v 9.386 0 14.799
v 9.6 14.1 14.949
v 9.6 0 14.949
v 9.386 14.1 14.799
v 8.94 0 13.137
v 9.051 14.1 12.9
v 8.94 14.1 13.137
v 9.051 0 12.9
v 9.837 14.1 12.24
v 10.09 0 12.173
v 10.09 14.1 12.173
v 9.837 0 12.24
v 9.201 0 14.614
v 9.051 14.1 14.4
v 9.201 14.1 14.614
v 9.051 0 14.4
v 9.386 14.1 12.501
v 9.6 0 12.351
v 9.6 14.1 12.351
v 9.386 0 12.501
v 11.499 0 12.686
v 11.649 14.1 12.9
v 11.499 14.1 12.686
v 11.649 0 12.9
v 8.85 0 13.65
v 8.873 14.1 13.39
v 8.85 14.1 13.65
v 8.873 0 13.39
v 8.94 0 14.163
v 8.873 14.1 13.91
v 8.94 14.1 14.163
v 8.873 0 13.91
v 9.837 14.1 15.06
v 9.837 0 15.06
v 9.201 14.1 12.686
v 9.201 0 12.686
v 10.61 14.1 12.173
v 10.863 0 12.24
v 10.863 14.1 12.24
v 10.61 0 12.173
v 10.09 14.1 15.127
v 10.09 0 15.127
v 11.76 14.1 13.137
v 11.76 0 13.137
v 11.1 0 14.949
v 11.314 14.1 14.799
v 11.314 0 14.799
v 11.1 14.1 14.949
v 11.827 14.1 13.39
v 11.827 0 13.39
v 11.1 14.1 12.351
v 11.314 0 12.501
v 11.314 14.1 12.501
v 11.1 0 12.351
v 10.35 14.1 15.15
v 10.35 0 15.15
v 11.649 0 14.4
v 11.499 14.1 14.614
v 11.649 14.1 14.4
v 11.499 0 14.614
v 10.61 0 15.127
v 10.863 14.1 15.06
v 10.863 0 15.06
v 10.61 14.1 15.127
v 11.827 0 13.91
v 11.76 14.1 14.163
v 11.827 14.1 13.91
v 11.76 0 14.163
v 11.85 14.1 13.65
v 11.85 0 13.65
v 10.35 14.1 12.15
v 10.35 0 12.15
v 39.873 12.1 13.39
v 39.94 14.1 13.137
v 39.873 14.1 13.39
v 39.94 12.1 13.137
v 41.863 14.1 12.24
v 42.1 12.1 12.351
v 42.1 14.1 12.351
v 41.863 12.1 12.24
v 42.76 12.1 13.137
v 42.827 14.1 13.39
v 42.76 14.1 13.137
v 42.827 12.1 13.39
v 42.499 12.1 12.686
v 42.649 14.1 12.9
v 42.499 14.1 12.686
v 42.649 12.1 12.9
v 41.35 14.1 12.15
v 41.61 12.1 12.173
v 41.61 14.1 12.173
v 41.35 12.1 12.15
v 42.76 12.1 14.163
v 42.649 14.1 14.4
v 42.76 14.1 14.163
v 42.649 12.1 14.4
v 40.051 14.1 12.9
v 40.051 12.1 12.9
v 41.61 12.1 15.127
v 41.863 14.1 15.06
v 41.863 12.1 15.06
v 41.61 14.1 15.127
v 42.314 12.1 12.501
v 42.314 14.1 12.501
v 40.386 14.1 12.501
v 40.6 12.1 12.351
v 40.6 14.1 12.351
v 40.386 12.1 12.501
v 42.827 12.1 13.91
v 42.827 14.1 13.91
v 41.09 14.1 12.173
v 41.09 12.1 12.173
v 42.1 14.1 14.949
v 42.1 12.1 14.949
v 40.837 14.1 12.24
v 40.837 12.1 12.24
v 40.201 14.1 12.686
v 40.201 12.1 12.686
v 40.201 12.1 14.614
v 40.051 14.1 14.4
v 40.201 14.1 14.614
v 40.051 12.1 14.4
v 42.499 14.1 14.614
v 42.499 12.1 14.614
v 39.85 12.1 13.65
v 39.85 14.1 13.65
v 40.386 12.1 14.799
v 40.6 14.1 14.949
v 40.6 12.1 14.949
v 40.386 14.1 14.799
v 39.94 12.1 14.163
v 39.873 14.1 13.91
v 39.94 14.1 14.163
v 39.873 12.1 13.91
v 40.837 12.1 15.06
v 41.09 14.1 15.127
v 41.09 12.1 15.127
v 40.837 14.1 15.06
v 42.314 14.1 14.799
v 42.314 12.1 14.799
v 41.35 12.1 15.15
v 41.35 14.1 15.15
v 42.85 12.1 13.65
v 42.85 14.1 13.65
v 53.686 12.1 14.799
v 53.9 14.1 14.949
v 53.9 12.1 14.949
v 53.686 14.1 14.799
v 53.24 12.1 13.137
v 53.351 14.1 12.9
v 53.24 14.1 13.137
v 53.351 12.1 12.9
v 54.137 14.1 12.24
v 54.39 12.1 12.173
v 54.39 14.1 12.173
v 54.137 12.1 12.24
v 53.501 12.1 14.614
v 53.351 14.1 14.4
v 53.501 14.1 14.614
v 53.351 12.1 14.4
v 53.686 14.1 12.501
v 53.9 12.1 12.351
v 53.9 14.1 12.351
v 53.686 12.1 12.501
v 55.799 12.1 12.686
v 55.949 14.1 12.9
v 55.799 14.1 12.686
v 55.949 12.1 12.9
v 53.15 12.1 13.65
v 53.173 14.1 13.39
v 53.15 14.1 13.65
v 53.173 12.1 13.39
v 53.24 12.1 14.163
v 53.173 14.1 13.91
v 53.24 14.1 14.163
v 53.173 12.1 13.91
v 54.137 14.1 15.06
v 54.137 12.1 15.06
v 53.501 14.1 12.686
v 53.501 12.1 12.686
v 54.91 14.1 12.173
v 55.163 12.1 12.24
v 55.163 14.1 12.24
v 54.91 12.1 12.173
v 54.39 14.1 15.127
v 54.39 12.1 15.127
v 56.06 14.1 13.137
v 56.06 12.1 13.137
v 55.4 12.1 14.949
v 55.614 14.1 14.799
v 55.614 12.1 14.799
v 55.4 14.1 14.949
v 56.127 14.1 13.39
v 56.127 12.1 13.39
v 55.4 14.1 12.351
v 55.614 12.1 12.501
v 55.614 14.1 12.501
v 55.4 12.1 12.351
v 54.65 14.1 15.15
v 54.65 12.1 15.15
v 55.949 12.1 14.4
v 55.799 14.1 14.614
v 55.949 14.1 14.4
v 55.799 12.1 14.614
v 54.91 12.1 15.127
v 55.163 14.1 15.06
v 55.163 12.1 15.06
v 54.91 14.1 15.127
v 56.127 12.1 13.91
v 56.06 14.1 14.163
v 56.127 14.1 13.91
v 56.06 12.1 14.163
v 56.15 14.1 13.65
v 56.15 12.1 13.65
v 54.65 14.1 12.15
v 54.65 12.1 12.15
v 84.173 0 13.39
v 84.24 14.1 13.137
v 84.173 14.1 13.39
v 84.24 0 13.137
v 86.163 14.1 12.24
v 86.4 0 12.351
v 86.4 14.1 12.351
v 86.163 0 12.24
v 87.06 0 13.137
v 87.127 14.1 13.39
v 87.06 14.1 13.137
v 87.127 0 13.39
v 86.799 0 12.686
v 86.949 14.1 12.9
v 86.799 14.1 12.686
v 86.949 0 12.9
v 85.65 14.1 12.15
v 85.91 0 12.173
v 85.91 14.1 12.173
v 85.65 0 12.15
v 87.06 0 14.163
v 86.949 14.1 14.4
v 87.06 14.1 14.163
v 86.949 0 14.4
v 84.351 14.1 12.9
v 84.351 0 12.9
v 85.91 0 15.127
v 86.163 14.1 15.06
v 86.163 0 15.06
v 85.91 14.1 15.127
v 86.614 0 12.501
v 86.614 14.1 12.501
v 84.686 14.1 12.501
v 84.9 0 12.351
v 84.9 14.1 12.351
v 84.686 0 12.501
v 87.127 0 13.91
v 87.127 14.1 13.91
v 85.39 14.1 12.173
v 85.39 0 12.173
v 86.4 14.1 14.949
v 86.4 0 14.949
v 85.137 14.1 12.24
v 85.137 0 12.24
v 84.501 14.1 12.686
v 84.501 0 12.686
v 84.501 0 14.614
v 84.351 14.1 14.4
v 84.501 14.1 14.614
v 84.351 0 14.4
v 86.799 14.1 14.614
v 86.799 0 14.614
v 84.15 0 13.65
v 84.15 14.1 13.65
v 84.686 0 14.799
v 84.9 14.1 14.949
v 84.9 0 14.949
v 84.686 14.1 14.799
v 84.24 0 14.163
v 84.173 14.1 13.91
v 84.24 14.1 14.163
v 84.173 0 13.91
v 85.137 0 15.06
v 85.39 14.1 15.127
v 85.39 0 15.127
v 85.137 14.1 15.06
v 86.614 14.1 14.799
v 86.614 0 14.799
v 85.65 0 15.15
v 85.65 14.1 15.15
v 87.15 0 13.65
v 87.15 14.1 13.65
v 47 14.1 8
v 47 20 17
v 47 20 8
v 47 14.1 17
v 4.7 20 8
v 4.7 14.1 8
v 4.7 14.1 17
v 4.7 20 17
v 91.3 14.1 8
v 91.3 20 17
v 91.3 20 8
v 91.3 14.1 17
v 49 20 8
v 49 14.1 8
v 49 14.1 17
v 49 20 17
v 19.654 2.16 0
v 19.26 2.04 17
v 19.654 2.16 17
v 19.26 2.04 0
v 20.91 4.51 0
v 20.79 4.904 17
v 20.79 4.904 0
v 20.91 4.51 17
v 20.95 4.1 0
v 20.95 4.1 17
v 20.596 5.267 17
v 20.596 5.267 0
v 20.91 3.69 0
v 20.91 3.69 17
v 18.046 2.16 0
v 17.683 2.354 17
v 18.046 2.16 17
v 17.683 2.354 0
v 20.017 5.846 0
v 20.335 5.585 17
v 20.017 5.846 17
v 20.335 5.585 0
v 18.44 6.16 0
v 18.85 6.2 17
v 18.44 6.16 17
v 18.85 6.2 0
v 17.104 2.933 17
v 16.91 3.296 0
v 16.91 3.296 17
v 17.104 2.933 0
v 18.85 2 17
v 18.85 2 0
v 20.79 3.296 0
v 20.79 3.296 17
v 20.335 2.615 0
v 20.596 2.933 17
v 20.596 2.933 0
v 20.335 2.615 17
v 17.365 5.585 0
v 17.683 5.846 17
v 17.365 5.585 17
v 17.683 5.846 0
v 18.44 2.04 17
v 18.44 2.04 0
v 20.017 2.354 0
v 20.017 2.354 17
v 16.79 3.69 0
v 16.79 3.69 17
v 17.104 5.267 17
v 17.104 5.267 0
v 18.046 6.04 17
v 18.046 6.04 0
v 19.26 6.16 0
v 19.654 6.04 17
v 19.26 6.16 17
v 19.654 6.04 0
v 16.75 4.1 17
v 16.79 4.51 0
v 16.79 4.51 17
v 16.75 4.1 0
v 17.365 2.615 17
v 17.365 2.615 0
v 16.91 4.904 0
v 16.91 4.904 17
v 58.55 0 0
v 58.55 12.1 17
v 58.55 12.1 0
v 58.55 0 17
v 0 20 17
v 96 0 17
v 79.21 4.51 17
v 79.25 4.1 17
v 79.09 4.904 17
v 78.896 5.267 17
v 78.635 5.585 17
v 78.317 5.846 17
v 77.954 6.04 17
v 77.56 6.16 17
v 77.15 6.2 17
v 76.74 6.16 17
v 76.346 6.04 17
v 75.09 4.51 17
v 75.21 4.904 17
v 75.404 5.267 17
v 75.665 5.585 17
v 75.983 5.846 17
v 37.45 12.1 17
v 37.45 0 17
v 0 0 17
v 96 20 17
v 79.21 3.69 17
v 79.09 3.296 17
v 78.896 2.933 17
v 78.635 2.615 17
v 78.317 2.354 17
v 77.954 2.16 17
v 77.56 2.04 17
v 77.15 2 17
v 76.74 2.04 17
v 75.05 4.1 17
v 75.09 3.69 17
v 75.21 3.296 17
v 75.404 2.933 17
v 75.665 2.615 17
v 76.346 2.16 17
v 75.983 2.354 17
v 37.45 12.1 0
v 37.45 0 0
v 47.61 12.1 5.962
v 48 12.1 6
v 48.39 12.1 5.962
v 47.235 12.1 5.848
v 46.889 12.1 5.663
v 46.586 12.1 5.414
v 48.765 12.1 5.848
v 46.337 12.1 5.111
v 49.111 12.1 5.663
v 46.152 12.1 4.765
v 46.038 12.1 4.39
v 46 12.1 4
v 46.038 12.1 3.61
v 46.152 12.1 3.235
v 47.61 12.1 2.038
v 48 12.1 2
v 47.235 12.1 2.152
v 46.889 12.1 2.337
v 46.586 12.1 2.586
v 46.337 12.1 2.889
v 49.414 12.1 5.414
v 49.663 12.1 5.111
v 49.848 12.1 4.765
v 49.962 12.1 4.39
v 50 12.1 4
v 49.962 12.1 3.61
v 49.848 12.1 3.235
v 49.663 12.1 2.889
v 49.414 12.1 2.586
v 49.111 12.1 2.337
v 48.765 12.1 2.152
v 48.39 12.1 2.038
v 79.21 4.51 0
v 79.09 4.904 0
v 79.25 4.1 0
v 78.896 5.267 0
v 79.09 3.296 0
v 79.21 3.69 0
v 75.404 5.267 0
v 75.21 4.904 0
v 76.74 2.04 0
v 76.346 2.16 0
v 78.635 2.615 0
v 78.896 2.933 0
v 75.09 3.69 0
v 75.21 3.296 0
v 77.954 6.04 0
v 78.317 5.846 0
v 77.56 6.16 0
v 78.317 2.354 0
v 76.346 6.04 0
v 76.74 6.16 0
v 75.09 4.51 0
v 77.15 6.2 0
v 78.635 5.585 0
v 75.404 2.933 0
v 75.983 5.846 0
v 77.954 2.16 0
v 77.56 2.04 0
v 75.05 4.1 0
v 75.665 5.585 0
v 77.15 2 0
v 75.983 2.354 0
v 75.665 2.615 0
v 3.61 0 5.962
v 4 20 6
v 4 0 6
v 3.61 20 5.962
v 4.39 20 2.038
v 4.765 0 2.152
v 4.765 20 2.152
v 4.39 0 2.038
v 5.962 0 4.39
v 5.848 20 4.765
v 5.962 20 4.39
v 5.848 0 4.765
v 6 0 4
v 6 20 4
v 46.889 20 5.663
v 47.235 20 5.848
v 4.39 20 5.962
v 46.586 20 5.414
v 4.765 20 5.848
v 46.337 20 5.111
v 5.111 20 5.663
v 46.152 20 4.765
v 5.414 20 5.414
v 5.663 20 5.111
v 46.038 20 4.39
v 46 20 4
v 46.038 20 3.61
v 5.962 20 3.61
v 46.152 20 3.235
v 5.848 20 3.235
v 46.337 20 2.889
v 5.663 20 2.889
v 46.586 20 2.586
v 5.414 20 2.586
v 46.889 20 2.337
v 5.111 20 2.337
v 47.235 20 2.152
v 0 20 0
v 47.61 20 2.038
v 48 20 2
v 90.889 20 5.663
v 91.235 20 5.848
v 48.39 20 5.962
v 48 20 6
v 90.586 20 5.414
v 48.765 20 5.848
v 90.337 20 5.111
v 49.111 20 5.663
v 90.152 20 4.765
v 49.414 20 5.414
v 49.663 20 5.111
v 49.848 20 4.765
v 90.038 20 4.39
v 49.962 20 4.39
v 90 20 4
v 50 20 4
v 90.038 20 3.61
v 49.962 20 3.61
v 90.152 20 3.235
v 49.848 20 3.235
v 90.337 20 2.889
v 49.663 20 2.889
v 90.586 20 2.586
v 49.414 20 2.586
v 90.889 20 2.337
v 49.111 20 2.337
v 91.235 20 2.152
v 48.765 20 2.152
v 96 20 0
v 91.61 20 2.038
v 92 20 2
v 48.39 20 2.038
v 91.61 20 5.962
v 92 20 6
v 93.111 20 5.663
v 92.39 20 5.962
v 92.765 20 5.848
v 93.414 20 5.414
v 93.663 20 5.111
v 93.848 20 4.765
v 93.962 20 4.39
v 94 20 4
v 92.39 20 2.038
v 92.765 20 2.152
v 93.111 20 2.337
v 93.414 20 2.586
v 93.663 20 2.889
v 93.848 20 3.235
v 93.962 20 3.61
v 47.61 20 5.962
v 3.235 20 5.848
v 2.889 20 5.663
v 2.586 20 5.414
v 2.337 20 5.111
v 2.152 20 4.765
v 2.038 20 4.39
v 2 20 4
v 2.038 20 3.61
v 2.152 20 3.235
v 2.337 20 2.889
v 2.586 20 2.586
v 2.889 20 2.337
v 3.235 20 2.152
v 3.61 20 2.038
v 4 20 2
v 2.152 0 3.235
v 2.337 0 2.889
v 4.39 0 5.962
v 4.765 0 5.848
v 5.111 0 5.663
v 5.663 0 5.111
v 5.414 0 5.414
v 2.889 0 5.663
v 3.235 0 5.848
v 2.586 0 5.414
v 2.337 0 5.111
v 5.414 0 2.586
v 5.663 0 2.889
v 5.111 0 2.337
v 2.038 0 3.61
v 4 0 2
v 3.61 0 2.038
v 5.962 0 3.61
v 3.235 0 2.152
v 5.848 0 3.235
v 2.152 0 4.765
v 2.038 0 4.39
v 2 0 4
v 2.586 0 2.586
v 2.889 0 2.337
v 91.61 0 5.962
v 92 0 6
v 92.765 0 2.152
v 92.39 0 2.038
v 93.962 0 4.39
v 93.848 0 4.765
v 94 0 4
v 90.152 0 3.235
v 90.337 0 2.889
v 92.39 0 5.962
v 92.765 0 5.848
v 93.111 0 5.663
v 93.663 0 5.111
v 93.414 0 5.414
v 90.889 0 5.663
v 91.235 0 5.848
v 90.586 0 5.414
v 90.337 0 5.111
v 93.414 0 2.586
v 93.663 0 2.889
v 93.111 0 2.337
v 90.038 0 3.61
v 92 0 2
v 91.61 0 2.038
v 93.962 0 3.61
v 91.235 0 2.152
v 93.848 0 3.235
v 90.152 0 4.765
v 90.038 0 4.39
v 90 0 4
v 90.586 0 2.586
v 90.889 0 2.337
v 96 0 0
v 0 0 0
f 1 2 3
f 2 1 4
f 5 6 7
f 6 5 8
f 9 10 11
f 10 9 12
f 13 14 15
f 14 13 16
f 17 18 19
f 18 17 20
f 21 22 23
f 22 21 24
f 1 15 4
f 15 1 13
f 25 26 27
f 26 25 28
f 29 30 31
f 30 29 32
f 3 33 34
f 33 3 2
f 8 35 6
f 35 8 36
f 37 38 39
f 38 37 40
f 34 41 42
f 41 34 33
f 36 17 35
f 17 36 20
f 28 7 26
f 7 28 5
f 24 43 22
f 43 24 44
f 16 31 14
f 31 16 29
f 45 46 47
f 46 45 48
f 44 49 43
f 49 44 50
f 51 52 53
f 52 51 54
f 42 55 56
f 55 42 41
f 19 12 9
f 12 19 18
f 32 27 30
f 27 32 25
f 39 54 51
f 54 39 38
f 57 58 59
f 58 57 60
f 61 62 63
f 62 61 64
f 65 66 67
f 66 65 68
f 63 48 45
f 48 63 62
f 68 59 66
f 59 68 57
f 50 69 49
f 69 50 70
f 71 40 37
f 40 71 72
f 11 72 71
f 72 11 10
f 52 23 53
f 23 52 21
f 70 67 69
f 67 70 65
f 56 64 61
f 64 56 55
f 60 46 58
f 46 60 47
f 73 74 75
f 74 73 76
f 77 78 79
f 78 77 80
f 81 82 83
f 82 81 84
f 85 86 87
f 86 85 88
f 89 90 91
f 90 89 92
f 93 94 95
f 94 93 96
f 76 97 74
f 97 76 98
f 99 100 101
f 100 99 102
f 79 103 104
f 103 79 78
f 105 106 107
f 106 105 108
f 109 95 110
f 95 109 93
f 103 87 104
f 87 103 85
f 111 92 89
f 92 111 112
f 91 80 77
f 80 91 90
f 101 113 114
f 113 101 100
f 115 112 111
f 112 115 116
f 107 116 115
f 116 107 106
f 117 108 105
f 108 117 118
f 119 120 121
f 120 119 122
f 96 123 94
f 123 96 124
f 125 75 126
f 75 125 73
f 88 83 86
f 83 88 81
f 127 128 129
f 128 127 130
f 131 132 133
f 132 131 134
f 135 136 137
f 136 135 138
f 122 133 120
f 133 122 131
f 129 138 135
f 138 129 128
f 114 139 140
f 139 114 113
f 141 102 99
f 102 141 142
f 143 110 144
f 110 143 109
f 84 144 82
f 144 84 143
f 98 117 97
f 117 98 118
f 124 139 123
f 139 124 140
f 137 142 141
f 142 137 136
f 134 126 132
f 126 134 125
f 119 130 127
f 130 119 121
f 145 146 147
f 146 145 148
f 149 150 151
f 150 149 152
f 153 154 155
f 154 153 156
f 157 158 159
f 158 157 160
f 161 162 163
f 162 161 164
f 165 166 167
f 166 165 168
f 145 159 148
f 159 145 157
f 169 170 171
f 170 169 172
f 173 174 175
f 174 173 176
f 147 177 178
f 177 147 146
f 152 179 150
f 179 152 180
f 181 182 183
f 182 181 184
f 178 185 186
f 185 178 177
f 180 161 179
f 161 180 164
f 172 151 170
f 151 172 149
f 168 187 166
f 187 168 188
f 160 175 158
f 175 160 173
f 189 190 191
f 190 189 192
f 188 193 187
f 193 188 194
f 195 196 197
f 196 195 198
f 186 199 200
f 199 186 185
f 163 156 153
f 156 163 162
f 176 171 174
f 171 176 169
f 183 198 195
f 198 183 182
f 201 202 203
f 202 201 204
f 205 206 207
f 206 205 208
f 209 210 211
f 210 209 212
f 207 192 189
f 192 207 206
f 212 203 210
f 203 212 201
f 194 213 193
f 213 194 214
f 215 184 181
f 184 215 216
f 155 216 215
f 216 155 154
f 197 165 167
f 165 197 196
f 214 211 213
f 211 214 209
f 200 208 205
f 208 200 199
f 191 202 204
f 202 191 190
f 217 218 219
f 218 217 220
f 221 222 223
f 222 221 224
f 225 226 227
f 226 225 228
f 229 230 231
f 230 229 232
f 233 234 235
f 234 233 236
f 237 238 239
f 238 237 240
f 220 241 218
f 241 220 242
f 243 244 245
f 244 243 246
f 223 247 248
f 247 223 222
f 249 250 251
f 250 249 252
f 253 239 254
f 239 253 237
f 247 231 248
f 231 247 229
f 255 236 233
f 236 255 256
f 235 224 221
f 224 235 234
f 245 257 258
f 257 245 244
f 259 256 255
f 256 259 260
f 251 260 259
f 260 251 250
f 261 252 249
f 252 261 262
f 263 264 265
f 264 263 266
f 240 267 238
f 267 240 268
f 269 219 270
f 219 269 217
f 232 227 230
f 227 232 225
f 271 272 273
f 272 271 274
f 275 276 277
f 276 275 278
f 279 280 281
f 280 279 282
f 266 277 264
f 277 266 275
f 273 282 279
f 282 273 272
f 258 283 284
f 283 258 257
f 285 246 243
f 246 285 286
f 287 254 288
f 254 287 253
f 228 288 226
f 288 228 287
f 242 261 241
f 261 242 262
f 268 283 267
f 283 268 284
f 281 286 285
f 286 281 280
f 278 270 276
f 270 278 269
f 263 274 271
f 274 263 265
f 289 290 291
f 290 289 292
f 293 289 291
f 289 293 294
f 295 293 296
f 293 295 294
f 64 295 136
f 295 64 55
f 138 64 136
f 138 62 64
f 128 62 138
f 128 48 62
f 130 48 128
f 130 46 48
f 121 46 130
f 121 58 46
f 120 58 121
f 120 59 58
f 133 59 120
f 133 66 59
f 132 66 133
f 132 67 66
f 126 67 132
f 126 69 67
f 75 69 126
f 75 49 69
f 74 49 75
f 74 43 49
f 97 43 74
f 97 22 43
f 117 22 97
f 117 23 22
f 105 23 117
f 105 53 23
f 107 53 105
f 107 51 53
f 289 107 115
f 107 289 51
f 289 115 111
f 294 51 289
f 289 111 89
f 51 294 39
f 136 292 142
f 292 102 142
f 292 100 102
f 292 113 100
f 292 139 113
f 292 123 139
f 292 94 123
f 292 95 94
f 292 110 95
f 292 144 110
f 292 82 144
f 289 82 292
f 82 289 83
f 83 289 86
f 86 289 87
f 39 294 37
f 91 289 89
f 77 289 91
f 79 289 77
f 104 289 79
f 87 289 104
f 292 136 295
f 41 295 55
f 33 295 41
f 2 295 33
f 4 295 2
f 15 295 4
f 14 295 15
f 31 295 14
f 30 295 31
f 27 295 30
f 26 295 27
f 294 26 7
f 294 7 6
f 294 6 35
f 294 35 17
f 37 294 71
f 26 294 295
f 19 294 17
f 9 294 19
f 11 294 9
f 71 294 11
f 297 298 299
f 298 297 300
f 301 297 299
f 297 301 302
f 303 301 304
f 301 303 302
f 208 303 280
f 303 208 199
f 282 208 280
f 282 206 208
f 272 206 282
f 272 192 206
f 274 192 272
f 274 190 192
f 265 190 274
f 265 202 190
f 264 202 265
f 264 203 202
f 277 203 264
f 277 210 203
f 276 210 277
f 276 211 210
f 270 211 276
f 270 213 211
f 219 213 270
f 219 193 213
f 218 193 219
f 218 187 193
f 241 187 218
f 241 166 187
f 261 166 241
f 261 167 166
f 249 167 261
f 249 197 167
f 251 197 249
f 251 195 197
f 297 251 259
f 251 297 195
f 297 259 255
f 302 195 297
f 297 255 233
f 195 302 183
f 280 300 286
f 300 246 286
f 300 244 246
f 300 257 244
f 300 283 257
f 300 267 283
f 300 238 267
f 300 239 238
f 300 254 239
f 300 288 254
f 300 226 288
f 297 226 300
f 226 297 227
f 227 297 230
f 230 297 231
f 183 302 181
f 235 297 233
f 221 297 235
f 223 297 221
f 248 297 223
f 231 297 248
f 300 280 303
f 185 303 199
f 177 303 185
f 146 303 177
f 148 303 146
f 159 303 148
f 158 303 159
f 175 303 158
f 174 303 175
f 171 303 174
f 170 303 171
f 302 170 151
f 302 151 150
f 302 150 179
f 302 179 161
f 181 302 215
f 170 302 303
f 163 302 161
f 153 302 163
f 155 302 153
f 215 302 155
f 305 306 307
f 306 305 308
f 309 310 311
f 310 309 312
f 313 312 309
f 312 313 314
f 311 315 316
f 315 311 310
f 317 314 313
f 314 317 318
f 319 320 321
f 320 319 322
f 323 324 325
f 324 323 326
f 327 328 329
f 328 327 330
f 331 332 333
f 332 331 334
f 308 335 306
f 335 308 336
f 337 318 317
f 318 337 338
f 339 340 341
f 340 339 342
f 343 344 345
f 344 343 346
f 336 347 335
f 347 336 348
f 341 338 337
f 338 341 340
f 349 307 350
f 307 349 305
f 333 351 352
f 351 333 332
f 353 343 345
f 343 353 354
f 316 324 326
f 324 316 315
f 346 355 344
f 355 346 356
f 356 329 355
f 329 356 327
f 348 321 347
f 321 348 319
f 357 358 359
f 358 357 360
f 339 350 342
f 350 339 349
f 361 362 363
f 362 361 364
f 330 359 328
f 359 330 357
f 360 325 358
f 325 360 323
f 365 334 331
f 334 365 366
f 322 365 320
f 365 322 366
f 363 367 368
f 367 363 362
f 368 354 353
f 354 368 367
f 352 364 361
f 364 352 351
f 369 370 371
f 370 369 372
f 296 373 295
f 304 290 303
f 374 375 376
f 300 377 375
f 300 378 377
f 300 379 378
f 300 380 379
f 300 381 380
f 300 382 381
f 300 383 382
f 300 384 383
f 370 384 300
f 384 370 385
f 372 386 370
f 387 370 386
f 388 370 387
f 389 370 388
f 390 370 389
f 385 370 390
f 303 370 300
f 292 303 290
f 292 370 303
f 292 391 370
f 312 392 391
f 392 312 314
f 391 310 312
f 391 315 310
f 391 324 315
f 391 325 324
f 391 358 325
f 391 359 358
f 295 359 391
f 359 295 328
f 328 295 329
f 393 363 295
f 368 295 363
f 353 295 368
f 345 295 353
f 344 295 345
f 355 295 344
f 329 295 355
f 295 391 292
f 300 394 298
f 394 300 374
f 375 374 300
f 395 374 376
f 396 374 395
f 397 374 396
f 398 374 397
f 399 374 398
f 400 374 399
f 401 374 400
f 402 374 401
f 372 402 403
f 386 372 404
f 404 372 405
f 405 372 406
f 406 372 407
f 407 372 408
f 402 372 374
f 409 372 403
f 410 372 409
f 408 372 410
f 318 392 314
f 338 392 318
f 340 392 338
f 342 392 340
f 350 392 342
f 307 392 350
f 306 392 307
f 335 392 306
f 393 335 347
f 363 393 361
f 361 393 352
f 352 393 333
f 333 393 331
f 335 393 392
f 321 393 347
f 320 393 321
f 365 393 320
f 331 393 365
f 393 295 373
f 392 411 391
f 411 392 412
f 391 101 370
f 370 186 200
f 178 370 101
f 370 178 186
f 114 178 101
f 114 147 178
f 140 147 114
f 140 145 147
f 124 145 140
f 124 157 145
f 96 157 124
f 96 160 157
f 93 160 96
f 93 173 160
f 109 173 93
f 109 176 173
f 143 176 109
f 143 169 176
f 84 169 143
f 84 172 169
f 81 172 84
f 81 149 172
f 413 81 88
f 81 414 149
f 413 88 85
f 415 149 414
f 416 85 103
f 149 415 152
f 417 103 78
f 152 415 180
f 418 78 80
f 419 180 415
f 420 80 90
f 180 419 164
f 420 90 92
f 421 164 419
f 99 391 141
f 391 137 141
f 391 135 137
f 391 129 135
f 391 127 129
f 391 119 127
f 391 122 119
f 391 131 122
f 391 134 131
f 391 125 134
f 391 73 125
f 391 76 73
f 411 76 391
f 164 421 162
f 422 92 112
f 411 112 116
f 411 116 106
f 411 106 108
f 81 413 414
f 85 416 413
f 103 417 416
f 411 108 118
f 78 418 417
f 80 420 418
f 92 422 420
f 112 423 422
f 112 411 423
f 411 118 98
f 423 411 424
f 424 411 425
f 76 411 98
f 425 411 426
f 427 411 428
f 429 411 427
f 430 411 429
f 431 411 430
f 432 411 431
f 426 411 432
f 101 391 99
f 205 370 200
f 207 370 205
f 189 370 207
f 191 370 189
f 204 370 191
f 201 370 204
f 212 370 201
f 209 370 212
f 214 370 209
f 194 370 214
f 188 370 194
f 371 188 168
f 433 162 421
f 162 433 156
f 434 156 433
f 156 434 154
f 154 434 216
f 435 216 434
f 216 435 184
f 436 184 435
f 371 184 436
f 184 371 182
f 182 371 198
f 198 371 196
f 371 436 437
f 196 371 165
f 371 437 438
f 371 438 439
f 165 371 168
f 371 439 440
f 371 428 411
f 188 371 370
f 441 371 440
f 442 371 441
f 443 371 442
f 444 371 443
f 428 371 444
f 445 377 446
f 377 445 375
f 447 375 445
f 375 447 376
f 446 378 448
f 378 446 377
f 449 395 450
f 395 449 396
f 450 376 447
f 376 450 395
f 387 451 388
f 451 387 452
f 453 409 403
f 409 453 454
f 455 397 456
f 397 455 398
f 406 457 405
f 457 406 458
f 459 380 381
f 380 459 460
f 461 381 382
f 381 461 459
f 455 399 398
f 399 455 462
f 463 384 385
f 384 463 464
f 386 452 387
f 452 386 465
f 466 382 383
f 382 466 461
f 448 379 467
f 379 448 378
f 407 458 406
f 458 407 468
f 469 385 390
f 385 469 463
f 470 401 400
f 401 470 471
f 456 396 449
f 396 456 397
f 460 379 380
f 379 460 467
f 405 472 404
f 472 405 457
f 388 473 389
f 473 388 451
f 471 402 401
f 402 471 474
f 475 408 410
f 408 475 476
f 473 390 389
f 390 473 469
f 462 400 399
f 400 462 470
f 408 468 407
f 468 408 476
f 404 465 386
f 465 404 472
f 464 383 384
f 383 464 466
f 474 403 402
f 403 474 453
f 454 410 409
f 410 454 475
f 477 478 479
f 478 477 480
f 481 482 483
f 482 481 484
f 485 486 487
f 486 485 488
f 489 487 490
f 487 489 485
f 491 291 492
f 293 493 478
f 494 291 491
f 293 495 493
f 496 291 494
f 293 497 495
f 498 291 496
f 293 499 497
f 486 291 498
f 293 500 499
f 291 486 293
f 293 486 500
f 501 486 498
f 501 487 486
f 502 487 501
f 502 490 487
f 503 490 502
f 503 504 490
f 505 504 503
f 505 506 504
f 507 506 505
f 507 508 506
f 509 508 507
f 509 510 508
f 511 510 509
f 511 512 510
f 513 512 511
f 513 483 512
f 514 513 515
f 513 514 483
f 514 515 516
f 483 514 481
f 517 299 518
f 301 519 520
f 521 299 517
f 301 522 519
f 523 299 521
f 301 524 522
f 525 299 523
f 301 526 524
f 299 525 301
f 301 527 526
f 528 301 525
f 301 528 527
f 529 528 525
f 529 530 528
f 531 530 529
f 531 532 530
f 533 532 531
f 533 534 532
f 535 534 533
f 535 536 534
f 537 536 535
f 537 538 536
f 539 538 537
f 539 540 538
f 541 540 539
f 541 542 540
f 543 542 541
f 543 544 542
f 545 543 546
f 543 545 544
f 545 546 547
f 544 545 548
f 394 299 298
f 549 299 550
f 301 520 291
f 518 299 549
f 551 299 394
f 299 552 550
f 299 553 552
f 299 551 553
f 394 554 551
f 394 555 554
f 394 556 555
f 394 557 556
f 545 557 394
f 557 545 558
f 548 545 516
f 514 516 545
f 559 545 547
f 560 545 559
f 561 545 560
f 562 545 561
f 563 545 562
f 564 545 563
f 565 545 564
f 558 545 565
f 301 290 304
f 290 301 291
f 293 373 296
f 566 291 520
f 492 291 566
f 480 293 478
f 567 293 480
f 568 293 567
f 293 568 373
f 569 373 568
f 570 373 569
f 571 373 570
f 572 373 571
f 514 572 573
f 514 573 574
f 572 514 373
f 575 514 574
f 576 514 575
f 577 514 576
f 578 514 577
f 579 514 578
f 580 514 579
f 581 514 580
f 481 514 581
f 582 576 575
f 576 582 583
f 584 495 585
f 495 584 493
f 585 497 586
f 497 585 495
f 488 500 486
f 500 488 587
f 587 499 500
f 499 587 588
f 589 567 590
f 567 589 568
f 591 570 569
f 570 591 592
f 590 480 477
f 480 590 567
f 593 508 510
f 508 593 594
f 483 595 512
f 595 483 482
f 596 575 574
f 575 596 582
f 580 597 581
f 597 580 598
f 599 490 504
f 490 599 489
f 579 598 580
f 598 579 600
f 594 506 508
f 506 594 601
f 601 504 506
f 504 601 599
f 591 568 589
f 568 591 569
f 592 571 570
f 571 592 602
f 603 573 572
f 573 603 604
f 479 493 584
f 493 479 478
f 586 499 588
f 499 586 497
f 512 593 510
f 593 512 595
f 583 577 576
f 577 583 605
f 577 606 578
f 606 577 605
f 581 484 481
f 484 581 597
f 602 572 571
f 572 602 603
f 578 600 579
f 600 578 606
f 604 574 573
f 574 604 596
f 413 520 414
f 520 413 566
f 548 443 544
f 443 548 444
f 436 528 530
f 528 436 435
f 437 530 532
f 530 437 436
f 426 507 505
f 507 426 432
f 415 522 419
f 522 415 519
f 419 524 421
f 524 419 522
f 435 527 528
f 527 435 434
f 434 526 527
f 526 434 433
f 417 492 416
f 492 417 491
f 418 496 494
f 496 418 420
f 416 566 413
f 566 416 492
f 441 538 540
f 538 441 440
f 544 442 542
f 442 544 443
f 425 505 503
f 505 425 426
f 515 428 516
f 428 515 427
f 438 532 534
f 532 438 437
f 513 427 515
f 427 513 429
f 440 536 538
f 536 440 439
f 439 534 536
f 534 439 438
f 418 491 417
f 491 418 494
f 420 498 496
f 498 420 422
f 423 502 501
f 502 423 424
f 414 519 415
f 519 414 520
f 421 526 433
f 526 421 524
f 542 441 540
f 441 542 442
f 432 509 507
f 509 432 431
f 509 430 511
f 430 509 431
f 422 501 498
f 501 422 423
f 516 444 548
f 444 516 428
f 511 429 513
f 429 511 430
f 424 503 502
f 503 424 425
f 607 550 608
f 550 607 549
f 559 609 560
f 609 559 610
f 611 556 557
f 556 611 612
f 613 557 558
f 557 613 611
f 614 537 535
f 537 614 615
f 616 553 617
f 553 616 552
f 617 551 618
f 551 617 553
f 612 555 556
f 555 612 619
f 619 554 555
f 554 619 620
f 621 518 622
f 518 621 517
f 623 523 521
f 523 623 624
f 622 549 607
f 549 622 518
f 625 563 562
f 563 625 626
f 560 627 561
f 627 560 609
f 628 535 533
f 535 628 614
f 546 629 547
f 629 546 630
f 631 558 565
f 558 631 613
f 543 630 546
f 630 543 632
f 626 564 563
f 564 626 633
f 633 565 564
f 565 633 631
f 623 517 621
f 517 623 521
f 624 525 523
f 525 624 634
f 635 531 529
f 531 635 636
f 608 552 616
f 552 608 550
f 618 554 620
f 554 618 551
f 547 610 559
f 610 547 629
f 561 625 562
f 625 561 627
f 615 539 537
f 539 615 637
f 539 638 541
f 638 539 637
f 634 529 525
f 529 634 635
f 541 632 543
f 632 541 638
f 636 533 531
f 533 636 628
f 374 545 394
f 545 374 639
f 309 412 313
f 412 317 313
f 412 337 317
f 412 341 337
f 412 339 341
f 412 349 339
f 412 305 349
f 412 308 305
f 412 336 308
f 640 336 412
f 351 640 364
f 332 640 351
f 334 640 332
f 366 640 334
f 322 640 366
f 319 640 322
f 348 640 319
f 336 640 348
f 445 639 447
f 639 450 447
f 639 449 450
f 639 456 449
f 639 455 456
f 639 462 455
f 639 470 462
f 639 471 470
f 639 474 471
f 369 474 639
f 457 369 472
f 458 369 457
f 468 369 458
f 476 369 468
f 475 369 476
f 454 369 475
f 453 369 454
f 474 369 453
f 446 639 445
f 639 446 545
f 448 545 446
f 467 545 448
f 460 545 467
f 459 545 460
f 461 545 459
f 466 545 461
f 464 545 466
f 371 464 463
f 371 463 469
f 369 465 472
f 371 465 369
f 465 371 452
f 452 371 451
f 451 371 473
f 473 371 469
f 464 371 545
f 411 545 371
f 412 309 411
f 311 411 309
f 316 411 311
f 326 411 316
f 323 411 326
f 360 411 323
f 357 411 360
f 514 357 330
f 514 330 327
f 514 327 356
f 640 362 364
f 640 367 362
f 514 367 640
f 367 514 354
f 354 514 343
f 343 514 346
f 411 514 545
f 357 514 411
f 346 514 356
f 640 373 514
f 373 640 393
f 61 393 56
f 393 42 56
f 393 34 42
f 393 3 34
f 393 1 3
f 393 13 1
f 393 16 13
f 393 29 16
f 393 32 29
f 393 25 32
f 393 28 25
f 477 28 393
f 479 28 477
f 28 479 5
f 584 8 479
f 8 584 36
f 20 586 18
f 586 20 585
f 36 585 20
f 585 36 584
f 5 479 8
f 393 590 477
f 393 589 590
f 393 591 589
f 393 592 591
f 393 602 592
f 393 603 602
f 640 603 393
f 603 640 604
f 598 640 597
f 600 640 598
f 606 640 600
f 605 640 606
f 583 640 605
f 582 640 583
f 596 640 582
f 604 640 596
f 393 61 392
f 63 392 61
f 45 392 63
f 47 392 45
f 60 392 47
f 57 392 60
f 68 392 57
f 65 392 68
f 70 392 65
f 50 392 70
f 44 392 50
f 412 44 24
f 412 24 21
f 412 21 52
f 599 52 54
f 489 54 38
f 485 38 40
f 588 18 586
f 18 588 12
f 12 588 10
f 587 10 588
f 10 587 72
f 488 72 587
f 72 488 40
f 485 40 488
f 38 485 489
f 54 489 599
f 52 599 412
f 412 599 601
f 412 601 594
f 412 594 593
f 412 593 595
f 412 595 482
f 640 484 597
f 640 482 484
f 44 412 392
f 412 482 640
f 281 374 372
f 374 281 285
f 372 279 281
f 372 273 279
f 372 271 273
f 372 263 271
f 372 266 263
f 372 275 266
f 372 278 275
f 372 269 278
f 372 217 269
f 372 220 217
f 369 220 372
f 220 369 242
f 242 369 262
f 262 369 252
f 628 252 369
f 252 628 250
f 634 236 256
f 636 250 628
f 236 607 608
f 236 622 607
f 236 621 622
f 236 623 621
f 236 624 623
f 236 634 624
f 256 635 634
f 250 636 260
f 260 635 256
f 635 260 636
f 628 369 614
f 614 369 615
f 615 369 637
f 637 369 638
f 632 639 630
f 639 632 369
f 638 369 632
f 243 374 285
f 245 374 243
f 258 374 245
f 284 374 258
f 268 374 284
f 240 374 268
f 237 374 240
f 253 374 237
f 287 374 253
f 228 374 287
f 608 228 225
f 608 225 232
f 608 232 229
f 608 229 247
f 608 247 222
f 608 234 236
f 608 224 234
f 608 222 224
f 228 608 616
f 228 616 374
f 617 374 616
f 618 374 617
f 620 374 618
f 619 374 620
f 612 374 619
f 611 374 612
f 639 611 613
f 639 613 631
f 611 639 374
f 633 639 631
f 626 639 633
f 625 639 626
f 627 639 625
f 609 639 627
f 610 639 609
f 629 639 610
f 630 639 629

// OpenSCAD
// file: configuration.scad
// adjust to your needs.
$fn=36;
wall_thick=2;// how far holes are from an edge

//motor mount
body_x=96;//this needs to be 2xmotor size + or larger ~96 for outsid path, and ~85 for inside path
body_y=20;
body_z=17;

//nema motor dimensions 31,42.3, 3 are good for nema17
nema_mount=31;// spacing of the mount holes 31mm, 
nema_body=42.3;//width of the motor body
nema_bolt=3;//mountbolt dia
//dimensions of the hob
hob_offy=10;//distance from the motors flat to the mk8 gear
hob_d1=-7;//diameter of the filament path a -number places the path  on the outside of the motors, a positive one on the inside 
inside=0;//1 to have the filament path on the center side of the motors

//hotend
hotend_dia=16.3;
groove=12.2;
groovez=4.6;
ptfe=4.2;//tube dia


nut=8.8;//hex nut size
mount_bolt=4;
mount_bolthead=15;
// bearing dimesnsions
bearing_l=30;
bearing_h=21;
smoothrod=12;

motorgap=(1);
xspace=45;
// main file
//motor mount and carriage interface
include <configuration.scad>;
$fn=32;
motor_mount();
module motor_mount(){
difference(){
cube ([body_x,body_y,body_z]);
motor();
ptfe_path();
mount();
}
module motor(){
    for (x=([(body_x/2-nema_body/2-motorgap),(body_x/2+nema_body/2+motorgap)])
    )
{
    translate ([x-nema_body/2,(hob_offy+ptfe/2+wall_thick) ,wall_thick*2+mount_bolt])
    cube (nema_body);
    translate ([x,(hob_offy+ptfe/2+wall_thick) ,wall_thick*2+mount_bolt+nema_body/2])
    rotate([90,0,0])
    for (i=[0:3]) {
      rotate([0, 0, 90*i]) translate([nema_mount/2, nema_mount/2, 0])
cylinder(h=hob_offy+ptfe/2+wall_thick+.1, d=nema_bolt, $fn=36);
}    
    
}
for (x=([(body_x/2-nema_body/2-motorgap),(body_x/2+nema_body/2+motorgap)])
    )
;}
module ptfe_path(){
    for (x=([(body_x/2-nema_body/2-motorgap+hob_d1),(body_x/2+nema_body/2+motorgap-hob_d1)
        ])
    )
    for (y=([ptfe/2+wall_thick]))
    {
        translate ([x, y,-.1])
        cylinder (d=ptfe, h=body_z+.2);
        
        // cutout using the motor mount as refernce
        translate ([body_x/2, 0])
        cube ([((nema_body-nema_mount+motorgap+nut)), (hob_offy+ptfe/2)*2, body_z*2], center=true);
        }
}

module mount(){
    for (x=([wall_thick+mount_bolt/2, body_x/2, body_x-wall_thick-mount_bolt/2 ]))
     
    {
        
        translate ([x, -.1, wall_thick+mount_bolt/2])
        rotate ([90,0,0])
        cylinder (h=body_y*2+.2, d=mount_bolt, center=true);
    }
}
}
